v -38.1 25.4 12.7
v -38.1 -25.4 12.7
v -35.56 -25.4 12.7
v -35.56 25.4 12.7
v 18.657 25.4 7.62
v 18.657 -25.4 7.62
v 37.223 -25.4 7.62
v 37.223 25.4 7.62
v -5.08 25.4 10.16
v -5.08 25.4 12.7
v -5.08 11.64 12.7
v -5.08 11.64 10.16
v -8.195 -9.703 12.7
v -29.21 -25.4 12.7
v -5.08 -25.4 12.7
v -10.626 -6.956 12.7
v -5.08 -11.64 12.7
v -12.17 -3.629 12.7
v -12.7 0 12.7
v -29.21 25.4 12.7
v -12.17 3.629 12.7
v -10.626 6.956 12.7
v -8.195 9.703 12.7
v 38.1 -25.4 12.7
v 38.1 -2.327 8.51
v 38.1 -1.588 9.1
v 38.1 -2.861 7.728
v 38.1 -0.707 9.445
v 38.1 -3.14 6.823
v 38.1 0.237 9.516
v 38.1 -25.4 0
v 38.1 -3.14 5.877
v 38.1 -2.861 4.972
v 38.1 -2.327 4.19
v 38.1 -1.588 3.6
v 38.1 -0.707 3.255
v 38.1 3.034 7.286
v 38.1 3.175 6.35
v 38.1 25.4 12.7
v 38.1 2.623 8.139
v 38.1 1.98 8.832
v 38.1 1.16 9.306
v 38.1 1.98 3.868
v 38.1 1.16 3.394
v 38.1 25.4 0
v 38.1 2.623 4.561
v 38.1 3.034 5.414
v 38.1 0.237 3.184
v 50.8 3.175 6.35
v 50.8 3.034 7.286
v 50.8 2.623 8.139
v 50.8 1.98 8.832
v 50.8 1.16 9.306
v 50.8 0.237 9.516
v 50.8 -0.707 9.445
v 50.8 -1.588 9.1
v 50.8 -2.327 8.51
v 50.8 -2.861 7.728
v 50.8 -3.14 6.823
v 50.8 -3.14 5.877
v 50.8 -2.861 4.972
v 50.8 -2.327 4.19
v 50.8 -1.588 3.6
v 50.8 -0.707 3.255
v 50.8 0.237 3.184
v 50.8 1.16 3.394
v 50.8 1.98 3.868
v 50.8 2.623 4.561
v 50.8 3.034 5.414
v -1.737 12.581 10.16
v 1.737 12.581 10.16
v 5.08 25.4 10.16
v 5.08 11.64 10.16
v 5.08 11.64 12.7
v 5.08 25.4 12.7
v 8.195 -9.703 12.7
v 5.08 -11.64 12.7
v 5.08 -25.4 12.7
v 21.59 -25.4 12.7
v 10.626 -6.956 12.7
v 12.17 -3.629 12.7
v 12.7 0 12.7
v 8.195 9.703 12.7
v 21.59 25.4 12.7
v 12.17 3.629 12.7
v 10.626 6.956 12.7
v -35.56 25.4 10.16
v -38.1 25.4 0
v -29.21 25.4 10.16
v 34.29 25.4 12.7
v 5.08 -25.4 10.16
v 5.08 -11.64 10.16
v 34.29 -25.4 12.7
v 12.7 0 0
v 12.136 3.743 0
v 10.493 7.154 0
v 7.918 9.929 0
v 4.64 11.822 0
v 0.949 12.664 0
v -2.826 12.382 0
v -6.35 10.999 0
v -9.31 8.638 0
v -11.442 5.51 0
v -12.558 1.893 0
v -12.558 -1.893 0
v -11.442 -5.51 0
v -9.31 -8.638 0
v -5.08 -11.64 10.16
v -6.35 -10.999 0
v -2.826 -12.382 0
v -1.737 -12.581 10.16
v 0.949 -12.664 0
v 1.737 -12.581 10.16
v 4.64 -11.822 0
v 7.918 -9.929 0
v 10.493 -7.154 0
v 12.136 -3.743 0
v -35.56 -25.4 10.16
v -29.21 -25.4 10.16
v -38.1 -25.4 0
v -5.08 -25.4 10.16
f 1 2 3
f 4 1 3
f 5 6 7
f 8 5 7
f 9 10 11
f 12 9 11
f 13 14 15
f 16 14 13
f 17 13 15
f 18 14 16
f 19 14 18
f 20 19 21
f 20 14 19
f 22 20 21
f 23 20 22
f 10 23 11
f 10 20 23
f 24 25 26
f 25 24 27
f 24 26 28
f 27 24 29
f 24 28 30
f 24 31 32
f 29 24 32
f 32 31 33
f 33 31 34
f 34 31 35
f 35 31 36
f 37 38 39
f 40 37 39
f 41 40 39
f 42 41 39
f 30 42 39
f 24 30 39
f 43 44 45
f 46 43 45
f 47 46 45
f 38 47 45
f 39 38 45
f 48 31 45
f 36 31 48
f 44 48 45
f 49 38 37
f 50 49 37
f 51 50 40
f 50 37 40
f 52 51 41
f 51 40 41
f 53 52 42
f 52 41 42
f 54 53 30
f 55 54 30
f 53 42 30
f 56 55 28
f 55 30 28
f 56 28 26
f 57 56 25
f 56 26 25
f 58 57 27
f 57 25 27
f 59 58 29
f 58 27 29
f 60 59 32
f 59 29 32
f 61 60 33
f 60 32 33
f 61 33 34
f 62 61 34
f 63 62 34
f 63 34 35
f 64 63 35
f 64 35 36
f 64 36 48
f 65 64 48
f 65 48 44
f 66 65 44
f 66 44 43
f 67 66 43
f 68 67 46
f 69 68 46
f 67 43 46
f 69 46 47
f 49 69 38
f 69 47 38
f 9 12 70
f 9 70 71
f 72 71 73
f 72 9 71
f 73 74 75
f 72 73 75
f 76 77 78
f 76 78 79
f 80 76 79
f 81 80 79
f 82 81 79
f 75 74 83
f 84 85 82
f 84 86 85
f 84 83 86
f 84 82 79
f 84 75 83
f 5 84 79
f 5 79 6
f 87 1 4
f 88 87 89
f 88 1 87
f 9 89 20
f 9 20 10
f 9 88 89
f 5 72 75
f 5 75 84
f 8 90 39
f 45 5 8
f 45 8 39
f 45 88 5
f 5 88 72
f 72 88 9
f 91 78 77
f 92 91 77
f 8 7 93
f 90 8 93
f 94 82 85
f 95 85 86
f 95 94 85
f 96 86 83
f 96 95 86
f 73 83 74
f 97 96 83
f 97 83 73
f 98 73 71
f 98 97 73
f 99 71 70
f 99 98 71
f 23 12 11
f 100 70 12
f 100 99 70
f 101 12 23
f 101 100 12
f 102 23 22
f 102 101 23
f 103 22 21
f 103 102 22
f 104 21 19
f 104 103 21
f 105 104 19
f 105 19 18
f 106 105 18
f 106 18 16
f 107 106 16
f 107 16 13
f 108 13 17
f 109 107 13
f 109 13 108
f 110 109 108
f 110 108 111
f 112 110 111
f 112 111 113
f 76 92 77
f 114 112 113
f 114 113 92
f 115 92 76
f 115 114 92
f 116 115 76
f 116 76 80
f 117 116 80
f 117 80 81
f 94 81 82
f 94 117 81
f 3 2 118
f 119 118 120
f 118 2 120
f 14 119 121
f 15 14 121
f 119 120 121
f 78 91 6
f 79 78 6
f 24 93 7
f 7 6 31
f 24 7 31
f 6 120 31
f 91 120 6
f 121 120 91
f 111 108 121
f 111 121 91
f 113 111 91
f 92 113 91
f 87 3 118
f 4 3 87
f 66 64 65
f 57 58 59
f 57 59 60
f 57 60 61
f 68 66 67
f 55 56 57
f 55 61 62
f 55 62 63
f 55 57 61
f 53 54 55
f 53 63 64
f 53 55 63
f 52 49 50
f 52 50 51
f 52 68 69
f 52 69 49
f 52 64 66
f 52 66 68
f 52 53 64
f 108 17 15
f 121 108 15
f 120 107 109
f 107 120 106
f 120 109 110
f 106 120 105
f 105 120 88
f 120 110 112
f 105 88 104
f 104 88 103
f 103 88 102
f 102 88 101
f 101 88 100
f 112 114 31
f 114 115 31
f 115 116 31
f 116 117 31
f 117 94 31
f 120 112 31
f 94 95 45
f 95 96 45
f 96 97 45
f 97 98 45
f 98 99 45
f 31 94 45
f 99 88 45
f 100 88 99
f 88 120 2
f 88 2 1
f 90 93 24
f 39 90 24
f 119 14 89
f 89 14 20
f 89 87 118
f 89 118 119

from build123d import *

# Parameters (mm, degrees)
F0_W     = 76.2
F0_H     = 50.8
F0_R     = 12.7
F1_DEPTH = 12.7
F2_W     = 6.35
F2_H     = 50.8
F3_DEPTH = 2.54
F5_DEPTH = 50.8508
F6_R     = 3.175
F7_DEPTH = 12.7


with BuildPart() as f1:
    # F0 (on Top) → F1 (new body)
    with BuildSketch(Plane.XY):
        Rectangle(F0_W, F0_H)
        Circle(F0_R, mode=Mode.SUBTRACT)
    extrude(amount=F1_DEPTH)

    # F2 (on face) → F3 (cut)
    with BuildSketch(Plane.XY.offset(12.7)):
        with BuildLine():
            ThreePointArc((5.08, -11.639742), (0, -12.7), (-5.08, -11.639742))
            Line((-5.08, -11.639742), (-5.08, -25.4))
            Line((-5.08, -25.4), (5.08, -25.4))
            Line((5.08, -25.4), (5.08, -11.639742))
        make_face()
        with BuildLine():
            Line((5.08, 25.4), (-5.08, 25.4))
            Line((-5.08, 25.4), (-5.08, 11.639742))
            ThreePointArc((-5.08, 11.639742), (0, 12.7), (5.08, 11.639742))
            Line((5.08, 11.639742), (5.08, 25.4))
        make_face()
        with Locations((-32.385, 0)):
            Rectangle(F2_W, F2_H)
    extrude(amount=-F3_DEPTH, mode=Mode.SUBTRACT)

    # F4 (on face) → F5 (cut)
    with BuildSketch(Plane.XZ.offset(25.4)):
        Polygon((34.29, 12.7), (21.59, 12.7), (18.657061, 7.62), (37.222939, 7.62), align=None)
    extrude(amount=-F5_DEPTH, mode=Mode.SUBTRACT)

    # F6 (on face) → F7 (join)
    with BuildSketch(Plane.YZ.offset(38.1)):
        with Locations((0, 6.35)):
            Circle(F6_R)
    extrude(amount=F7_DEPTH)


solid = f1.part
